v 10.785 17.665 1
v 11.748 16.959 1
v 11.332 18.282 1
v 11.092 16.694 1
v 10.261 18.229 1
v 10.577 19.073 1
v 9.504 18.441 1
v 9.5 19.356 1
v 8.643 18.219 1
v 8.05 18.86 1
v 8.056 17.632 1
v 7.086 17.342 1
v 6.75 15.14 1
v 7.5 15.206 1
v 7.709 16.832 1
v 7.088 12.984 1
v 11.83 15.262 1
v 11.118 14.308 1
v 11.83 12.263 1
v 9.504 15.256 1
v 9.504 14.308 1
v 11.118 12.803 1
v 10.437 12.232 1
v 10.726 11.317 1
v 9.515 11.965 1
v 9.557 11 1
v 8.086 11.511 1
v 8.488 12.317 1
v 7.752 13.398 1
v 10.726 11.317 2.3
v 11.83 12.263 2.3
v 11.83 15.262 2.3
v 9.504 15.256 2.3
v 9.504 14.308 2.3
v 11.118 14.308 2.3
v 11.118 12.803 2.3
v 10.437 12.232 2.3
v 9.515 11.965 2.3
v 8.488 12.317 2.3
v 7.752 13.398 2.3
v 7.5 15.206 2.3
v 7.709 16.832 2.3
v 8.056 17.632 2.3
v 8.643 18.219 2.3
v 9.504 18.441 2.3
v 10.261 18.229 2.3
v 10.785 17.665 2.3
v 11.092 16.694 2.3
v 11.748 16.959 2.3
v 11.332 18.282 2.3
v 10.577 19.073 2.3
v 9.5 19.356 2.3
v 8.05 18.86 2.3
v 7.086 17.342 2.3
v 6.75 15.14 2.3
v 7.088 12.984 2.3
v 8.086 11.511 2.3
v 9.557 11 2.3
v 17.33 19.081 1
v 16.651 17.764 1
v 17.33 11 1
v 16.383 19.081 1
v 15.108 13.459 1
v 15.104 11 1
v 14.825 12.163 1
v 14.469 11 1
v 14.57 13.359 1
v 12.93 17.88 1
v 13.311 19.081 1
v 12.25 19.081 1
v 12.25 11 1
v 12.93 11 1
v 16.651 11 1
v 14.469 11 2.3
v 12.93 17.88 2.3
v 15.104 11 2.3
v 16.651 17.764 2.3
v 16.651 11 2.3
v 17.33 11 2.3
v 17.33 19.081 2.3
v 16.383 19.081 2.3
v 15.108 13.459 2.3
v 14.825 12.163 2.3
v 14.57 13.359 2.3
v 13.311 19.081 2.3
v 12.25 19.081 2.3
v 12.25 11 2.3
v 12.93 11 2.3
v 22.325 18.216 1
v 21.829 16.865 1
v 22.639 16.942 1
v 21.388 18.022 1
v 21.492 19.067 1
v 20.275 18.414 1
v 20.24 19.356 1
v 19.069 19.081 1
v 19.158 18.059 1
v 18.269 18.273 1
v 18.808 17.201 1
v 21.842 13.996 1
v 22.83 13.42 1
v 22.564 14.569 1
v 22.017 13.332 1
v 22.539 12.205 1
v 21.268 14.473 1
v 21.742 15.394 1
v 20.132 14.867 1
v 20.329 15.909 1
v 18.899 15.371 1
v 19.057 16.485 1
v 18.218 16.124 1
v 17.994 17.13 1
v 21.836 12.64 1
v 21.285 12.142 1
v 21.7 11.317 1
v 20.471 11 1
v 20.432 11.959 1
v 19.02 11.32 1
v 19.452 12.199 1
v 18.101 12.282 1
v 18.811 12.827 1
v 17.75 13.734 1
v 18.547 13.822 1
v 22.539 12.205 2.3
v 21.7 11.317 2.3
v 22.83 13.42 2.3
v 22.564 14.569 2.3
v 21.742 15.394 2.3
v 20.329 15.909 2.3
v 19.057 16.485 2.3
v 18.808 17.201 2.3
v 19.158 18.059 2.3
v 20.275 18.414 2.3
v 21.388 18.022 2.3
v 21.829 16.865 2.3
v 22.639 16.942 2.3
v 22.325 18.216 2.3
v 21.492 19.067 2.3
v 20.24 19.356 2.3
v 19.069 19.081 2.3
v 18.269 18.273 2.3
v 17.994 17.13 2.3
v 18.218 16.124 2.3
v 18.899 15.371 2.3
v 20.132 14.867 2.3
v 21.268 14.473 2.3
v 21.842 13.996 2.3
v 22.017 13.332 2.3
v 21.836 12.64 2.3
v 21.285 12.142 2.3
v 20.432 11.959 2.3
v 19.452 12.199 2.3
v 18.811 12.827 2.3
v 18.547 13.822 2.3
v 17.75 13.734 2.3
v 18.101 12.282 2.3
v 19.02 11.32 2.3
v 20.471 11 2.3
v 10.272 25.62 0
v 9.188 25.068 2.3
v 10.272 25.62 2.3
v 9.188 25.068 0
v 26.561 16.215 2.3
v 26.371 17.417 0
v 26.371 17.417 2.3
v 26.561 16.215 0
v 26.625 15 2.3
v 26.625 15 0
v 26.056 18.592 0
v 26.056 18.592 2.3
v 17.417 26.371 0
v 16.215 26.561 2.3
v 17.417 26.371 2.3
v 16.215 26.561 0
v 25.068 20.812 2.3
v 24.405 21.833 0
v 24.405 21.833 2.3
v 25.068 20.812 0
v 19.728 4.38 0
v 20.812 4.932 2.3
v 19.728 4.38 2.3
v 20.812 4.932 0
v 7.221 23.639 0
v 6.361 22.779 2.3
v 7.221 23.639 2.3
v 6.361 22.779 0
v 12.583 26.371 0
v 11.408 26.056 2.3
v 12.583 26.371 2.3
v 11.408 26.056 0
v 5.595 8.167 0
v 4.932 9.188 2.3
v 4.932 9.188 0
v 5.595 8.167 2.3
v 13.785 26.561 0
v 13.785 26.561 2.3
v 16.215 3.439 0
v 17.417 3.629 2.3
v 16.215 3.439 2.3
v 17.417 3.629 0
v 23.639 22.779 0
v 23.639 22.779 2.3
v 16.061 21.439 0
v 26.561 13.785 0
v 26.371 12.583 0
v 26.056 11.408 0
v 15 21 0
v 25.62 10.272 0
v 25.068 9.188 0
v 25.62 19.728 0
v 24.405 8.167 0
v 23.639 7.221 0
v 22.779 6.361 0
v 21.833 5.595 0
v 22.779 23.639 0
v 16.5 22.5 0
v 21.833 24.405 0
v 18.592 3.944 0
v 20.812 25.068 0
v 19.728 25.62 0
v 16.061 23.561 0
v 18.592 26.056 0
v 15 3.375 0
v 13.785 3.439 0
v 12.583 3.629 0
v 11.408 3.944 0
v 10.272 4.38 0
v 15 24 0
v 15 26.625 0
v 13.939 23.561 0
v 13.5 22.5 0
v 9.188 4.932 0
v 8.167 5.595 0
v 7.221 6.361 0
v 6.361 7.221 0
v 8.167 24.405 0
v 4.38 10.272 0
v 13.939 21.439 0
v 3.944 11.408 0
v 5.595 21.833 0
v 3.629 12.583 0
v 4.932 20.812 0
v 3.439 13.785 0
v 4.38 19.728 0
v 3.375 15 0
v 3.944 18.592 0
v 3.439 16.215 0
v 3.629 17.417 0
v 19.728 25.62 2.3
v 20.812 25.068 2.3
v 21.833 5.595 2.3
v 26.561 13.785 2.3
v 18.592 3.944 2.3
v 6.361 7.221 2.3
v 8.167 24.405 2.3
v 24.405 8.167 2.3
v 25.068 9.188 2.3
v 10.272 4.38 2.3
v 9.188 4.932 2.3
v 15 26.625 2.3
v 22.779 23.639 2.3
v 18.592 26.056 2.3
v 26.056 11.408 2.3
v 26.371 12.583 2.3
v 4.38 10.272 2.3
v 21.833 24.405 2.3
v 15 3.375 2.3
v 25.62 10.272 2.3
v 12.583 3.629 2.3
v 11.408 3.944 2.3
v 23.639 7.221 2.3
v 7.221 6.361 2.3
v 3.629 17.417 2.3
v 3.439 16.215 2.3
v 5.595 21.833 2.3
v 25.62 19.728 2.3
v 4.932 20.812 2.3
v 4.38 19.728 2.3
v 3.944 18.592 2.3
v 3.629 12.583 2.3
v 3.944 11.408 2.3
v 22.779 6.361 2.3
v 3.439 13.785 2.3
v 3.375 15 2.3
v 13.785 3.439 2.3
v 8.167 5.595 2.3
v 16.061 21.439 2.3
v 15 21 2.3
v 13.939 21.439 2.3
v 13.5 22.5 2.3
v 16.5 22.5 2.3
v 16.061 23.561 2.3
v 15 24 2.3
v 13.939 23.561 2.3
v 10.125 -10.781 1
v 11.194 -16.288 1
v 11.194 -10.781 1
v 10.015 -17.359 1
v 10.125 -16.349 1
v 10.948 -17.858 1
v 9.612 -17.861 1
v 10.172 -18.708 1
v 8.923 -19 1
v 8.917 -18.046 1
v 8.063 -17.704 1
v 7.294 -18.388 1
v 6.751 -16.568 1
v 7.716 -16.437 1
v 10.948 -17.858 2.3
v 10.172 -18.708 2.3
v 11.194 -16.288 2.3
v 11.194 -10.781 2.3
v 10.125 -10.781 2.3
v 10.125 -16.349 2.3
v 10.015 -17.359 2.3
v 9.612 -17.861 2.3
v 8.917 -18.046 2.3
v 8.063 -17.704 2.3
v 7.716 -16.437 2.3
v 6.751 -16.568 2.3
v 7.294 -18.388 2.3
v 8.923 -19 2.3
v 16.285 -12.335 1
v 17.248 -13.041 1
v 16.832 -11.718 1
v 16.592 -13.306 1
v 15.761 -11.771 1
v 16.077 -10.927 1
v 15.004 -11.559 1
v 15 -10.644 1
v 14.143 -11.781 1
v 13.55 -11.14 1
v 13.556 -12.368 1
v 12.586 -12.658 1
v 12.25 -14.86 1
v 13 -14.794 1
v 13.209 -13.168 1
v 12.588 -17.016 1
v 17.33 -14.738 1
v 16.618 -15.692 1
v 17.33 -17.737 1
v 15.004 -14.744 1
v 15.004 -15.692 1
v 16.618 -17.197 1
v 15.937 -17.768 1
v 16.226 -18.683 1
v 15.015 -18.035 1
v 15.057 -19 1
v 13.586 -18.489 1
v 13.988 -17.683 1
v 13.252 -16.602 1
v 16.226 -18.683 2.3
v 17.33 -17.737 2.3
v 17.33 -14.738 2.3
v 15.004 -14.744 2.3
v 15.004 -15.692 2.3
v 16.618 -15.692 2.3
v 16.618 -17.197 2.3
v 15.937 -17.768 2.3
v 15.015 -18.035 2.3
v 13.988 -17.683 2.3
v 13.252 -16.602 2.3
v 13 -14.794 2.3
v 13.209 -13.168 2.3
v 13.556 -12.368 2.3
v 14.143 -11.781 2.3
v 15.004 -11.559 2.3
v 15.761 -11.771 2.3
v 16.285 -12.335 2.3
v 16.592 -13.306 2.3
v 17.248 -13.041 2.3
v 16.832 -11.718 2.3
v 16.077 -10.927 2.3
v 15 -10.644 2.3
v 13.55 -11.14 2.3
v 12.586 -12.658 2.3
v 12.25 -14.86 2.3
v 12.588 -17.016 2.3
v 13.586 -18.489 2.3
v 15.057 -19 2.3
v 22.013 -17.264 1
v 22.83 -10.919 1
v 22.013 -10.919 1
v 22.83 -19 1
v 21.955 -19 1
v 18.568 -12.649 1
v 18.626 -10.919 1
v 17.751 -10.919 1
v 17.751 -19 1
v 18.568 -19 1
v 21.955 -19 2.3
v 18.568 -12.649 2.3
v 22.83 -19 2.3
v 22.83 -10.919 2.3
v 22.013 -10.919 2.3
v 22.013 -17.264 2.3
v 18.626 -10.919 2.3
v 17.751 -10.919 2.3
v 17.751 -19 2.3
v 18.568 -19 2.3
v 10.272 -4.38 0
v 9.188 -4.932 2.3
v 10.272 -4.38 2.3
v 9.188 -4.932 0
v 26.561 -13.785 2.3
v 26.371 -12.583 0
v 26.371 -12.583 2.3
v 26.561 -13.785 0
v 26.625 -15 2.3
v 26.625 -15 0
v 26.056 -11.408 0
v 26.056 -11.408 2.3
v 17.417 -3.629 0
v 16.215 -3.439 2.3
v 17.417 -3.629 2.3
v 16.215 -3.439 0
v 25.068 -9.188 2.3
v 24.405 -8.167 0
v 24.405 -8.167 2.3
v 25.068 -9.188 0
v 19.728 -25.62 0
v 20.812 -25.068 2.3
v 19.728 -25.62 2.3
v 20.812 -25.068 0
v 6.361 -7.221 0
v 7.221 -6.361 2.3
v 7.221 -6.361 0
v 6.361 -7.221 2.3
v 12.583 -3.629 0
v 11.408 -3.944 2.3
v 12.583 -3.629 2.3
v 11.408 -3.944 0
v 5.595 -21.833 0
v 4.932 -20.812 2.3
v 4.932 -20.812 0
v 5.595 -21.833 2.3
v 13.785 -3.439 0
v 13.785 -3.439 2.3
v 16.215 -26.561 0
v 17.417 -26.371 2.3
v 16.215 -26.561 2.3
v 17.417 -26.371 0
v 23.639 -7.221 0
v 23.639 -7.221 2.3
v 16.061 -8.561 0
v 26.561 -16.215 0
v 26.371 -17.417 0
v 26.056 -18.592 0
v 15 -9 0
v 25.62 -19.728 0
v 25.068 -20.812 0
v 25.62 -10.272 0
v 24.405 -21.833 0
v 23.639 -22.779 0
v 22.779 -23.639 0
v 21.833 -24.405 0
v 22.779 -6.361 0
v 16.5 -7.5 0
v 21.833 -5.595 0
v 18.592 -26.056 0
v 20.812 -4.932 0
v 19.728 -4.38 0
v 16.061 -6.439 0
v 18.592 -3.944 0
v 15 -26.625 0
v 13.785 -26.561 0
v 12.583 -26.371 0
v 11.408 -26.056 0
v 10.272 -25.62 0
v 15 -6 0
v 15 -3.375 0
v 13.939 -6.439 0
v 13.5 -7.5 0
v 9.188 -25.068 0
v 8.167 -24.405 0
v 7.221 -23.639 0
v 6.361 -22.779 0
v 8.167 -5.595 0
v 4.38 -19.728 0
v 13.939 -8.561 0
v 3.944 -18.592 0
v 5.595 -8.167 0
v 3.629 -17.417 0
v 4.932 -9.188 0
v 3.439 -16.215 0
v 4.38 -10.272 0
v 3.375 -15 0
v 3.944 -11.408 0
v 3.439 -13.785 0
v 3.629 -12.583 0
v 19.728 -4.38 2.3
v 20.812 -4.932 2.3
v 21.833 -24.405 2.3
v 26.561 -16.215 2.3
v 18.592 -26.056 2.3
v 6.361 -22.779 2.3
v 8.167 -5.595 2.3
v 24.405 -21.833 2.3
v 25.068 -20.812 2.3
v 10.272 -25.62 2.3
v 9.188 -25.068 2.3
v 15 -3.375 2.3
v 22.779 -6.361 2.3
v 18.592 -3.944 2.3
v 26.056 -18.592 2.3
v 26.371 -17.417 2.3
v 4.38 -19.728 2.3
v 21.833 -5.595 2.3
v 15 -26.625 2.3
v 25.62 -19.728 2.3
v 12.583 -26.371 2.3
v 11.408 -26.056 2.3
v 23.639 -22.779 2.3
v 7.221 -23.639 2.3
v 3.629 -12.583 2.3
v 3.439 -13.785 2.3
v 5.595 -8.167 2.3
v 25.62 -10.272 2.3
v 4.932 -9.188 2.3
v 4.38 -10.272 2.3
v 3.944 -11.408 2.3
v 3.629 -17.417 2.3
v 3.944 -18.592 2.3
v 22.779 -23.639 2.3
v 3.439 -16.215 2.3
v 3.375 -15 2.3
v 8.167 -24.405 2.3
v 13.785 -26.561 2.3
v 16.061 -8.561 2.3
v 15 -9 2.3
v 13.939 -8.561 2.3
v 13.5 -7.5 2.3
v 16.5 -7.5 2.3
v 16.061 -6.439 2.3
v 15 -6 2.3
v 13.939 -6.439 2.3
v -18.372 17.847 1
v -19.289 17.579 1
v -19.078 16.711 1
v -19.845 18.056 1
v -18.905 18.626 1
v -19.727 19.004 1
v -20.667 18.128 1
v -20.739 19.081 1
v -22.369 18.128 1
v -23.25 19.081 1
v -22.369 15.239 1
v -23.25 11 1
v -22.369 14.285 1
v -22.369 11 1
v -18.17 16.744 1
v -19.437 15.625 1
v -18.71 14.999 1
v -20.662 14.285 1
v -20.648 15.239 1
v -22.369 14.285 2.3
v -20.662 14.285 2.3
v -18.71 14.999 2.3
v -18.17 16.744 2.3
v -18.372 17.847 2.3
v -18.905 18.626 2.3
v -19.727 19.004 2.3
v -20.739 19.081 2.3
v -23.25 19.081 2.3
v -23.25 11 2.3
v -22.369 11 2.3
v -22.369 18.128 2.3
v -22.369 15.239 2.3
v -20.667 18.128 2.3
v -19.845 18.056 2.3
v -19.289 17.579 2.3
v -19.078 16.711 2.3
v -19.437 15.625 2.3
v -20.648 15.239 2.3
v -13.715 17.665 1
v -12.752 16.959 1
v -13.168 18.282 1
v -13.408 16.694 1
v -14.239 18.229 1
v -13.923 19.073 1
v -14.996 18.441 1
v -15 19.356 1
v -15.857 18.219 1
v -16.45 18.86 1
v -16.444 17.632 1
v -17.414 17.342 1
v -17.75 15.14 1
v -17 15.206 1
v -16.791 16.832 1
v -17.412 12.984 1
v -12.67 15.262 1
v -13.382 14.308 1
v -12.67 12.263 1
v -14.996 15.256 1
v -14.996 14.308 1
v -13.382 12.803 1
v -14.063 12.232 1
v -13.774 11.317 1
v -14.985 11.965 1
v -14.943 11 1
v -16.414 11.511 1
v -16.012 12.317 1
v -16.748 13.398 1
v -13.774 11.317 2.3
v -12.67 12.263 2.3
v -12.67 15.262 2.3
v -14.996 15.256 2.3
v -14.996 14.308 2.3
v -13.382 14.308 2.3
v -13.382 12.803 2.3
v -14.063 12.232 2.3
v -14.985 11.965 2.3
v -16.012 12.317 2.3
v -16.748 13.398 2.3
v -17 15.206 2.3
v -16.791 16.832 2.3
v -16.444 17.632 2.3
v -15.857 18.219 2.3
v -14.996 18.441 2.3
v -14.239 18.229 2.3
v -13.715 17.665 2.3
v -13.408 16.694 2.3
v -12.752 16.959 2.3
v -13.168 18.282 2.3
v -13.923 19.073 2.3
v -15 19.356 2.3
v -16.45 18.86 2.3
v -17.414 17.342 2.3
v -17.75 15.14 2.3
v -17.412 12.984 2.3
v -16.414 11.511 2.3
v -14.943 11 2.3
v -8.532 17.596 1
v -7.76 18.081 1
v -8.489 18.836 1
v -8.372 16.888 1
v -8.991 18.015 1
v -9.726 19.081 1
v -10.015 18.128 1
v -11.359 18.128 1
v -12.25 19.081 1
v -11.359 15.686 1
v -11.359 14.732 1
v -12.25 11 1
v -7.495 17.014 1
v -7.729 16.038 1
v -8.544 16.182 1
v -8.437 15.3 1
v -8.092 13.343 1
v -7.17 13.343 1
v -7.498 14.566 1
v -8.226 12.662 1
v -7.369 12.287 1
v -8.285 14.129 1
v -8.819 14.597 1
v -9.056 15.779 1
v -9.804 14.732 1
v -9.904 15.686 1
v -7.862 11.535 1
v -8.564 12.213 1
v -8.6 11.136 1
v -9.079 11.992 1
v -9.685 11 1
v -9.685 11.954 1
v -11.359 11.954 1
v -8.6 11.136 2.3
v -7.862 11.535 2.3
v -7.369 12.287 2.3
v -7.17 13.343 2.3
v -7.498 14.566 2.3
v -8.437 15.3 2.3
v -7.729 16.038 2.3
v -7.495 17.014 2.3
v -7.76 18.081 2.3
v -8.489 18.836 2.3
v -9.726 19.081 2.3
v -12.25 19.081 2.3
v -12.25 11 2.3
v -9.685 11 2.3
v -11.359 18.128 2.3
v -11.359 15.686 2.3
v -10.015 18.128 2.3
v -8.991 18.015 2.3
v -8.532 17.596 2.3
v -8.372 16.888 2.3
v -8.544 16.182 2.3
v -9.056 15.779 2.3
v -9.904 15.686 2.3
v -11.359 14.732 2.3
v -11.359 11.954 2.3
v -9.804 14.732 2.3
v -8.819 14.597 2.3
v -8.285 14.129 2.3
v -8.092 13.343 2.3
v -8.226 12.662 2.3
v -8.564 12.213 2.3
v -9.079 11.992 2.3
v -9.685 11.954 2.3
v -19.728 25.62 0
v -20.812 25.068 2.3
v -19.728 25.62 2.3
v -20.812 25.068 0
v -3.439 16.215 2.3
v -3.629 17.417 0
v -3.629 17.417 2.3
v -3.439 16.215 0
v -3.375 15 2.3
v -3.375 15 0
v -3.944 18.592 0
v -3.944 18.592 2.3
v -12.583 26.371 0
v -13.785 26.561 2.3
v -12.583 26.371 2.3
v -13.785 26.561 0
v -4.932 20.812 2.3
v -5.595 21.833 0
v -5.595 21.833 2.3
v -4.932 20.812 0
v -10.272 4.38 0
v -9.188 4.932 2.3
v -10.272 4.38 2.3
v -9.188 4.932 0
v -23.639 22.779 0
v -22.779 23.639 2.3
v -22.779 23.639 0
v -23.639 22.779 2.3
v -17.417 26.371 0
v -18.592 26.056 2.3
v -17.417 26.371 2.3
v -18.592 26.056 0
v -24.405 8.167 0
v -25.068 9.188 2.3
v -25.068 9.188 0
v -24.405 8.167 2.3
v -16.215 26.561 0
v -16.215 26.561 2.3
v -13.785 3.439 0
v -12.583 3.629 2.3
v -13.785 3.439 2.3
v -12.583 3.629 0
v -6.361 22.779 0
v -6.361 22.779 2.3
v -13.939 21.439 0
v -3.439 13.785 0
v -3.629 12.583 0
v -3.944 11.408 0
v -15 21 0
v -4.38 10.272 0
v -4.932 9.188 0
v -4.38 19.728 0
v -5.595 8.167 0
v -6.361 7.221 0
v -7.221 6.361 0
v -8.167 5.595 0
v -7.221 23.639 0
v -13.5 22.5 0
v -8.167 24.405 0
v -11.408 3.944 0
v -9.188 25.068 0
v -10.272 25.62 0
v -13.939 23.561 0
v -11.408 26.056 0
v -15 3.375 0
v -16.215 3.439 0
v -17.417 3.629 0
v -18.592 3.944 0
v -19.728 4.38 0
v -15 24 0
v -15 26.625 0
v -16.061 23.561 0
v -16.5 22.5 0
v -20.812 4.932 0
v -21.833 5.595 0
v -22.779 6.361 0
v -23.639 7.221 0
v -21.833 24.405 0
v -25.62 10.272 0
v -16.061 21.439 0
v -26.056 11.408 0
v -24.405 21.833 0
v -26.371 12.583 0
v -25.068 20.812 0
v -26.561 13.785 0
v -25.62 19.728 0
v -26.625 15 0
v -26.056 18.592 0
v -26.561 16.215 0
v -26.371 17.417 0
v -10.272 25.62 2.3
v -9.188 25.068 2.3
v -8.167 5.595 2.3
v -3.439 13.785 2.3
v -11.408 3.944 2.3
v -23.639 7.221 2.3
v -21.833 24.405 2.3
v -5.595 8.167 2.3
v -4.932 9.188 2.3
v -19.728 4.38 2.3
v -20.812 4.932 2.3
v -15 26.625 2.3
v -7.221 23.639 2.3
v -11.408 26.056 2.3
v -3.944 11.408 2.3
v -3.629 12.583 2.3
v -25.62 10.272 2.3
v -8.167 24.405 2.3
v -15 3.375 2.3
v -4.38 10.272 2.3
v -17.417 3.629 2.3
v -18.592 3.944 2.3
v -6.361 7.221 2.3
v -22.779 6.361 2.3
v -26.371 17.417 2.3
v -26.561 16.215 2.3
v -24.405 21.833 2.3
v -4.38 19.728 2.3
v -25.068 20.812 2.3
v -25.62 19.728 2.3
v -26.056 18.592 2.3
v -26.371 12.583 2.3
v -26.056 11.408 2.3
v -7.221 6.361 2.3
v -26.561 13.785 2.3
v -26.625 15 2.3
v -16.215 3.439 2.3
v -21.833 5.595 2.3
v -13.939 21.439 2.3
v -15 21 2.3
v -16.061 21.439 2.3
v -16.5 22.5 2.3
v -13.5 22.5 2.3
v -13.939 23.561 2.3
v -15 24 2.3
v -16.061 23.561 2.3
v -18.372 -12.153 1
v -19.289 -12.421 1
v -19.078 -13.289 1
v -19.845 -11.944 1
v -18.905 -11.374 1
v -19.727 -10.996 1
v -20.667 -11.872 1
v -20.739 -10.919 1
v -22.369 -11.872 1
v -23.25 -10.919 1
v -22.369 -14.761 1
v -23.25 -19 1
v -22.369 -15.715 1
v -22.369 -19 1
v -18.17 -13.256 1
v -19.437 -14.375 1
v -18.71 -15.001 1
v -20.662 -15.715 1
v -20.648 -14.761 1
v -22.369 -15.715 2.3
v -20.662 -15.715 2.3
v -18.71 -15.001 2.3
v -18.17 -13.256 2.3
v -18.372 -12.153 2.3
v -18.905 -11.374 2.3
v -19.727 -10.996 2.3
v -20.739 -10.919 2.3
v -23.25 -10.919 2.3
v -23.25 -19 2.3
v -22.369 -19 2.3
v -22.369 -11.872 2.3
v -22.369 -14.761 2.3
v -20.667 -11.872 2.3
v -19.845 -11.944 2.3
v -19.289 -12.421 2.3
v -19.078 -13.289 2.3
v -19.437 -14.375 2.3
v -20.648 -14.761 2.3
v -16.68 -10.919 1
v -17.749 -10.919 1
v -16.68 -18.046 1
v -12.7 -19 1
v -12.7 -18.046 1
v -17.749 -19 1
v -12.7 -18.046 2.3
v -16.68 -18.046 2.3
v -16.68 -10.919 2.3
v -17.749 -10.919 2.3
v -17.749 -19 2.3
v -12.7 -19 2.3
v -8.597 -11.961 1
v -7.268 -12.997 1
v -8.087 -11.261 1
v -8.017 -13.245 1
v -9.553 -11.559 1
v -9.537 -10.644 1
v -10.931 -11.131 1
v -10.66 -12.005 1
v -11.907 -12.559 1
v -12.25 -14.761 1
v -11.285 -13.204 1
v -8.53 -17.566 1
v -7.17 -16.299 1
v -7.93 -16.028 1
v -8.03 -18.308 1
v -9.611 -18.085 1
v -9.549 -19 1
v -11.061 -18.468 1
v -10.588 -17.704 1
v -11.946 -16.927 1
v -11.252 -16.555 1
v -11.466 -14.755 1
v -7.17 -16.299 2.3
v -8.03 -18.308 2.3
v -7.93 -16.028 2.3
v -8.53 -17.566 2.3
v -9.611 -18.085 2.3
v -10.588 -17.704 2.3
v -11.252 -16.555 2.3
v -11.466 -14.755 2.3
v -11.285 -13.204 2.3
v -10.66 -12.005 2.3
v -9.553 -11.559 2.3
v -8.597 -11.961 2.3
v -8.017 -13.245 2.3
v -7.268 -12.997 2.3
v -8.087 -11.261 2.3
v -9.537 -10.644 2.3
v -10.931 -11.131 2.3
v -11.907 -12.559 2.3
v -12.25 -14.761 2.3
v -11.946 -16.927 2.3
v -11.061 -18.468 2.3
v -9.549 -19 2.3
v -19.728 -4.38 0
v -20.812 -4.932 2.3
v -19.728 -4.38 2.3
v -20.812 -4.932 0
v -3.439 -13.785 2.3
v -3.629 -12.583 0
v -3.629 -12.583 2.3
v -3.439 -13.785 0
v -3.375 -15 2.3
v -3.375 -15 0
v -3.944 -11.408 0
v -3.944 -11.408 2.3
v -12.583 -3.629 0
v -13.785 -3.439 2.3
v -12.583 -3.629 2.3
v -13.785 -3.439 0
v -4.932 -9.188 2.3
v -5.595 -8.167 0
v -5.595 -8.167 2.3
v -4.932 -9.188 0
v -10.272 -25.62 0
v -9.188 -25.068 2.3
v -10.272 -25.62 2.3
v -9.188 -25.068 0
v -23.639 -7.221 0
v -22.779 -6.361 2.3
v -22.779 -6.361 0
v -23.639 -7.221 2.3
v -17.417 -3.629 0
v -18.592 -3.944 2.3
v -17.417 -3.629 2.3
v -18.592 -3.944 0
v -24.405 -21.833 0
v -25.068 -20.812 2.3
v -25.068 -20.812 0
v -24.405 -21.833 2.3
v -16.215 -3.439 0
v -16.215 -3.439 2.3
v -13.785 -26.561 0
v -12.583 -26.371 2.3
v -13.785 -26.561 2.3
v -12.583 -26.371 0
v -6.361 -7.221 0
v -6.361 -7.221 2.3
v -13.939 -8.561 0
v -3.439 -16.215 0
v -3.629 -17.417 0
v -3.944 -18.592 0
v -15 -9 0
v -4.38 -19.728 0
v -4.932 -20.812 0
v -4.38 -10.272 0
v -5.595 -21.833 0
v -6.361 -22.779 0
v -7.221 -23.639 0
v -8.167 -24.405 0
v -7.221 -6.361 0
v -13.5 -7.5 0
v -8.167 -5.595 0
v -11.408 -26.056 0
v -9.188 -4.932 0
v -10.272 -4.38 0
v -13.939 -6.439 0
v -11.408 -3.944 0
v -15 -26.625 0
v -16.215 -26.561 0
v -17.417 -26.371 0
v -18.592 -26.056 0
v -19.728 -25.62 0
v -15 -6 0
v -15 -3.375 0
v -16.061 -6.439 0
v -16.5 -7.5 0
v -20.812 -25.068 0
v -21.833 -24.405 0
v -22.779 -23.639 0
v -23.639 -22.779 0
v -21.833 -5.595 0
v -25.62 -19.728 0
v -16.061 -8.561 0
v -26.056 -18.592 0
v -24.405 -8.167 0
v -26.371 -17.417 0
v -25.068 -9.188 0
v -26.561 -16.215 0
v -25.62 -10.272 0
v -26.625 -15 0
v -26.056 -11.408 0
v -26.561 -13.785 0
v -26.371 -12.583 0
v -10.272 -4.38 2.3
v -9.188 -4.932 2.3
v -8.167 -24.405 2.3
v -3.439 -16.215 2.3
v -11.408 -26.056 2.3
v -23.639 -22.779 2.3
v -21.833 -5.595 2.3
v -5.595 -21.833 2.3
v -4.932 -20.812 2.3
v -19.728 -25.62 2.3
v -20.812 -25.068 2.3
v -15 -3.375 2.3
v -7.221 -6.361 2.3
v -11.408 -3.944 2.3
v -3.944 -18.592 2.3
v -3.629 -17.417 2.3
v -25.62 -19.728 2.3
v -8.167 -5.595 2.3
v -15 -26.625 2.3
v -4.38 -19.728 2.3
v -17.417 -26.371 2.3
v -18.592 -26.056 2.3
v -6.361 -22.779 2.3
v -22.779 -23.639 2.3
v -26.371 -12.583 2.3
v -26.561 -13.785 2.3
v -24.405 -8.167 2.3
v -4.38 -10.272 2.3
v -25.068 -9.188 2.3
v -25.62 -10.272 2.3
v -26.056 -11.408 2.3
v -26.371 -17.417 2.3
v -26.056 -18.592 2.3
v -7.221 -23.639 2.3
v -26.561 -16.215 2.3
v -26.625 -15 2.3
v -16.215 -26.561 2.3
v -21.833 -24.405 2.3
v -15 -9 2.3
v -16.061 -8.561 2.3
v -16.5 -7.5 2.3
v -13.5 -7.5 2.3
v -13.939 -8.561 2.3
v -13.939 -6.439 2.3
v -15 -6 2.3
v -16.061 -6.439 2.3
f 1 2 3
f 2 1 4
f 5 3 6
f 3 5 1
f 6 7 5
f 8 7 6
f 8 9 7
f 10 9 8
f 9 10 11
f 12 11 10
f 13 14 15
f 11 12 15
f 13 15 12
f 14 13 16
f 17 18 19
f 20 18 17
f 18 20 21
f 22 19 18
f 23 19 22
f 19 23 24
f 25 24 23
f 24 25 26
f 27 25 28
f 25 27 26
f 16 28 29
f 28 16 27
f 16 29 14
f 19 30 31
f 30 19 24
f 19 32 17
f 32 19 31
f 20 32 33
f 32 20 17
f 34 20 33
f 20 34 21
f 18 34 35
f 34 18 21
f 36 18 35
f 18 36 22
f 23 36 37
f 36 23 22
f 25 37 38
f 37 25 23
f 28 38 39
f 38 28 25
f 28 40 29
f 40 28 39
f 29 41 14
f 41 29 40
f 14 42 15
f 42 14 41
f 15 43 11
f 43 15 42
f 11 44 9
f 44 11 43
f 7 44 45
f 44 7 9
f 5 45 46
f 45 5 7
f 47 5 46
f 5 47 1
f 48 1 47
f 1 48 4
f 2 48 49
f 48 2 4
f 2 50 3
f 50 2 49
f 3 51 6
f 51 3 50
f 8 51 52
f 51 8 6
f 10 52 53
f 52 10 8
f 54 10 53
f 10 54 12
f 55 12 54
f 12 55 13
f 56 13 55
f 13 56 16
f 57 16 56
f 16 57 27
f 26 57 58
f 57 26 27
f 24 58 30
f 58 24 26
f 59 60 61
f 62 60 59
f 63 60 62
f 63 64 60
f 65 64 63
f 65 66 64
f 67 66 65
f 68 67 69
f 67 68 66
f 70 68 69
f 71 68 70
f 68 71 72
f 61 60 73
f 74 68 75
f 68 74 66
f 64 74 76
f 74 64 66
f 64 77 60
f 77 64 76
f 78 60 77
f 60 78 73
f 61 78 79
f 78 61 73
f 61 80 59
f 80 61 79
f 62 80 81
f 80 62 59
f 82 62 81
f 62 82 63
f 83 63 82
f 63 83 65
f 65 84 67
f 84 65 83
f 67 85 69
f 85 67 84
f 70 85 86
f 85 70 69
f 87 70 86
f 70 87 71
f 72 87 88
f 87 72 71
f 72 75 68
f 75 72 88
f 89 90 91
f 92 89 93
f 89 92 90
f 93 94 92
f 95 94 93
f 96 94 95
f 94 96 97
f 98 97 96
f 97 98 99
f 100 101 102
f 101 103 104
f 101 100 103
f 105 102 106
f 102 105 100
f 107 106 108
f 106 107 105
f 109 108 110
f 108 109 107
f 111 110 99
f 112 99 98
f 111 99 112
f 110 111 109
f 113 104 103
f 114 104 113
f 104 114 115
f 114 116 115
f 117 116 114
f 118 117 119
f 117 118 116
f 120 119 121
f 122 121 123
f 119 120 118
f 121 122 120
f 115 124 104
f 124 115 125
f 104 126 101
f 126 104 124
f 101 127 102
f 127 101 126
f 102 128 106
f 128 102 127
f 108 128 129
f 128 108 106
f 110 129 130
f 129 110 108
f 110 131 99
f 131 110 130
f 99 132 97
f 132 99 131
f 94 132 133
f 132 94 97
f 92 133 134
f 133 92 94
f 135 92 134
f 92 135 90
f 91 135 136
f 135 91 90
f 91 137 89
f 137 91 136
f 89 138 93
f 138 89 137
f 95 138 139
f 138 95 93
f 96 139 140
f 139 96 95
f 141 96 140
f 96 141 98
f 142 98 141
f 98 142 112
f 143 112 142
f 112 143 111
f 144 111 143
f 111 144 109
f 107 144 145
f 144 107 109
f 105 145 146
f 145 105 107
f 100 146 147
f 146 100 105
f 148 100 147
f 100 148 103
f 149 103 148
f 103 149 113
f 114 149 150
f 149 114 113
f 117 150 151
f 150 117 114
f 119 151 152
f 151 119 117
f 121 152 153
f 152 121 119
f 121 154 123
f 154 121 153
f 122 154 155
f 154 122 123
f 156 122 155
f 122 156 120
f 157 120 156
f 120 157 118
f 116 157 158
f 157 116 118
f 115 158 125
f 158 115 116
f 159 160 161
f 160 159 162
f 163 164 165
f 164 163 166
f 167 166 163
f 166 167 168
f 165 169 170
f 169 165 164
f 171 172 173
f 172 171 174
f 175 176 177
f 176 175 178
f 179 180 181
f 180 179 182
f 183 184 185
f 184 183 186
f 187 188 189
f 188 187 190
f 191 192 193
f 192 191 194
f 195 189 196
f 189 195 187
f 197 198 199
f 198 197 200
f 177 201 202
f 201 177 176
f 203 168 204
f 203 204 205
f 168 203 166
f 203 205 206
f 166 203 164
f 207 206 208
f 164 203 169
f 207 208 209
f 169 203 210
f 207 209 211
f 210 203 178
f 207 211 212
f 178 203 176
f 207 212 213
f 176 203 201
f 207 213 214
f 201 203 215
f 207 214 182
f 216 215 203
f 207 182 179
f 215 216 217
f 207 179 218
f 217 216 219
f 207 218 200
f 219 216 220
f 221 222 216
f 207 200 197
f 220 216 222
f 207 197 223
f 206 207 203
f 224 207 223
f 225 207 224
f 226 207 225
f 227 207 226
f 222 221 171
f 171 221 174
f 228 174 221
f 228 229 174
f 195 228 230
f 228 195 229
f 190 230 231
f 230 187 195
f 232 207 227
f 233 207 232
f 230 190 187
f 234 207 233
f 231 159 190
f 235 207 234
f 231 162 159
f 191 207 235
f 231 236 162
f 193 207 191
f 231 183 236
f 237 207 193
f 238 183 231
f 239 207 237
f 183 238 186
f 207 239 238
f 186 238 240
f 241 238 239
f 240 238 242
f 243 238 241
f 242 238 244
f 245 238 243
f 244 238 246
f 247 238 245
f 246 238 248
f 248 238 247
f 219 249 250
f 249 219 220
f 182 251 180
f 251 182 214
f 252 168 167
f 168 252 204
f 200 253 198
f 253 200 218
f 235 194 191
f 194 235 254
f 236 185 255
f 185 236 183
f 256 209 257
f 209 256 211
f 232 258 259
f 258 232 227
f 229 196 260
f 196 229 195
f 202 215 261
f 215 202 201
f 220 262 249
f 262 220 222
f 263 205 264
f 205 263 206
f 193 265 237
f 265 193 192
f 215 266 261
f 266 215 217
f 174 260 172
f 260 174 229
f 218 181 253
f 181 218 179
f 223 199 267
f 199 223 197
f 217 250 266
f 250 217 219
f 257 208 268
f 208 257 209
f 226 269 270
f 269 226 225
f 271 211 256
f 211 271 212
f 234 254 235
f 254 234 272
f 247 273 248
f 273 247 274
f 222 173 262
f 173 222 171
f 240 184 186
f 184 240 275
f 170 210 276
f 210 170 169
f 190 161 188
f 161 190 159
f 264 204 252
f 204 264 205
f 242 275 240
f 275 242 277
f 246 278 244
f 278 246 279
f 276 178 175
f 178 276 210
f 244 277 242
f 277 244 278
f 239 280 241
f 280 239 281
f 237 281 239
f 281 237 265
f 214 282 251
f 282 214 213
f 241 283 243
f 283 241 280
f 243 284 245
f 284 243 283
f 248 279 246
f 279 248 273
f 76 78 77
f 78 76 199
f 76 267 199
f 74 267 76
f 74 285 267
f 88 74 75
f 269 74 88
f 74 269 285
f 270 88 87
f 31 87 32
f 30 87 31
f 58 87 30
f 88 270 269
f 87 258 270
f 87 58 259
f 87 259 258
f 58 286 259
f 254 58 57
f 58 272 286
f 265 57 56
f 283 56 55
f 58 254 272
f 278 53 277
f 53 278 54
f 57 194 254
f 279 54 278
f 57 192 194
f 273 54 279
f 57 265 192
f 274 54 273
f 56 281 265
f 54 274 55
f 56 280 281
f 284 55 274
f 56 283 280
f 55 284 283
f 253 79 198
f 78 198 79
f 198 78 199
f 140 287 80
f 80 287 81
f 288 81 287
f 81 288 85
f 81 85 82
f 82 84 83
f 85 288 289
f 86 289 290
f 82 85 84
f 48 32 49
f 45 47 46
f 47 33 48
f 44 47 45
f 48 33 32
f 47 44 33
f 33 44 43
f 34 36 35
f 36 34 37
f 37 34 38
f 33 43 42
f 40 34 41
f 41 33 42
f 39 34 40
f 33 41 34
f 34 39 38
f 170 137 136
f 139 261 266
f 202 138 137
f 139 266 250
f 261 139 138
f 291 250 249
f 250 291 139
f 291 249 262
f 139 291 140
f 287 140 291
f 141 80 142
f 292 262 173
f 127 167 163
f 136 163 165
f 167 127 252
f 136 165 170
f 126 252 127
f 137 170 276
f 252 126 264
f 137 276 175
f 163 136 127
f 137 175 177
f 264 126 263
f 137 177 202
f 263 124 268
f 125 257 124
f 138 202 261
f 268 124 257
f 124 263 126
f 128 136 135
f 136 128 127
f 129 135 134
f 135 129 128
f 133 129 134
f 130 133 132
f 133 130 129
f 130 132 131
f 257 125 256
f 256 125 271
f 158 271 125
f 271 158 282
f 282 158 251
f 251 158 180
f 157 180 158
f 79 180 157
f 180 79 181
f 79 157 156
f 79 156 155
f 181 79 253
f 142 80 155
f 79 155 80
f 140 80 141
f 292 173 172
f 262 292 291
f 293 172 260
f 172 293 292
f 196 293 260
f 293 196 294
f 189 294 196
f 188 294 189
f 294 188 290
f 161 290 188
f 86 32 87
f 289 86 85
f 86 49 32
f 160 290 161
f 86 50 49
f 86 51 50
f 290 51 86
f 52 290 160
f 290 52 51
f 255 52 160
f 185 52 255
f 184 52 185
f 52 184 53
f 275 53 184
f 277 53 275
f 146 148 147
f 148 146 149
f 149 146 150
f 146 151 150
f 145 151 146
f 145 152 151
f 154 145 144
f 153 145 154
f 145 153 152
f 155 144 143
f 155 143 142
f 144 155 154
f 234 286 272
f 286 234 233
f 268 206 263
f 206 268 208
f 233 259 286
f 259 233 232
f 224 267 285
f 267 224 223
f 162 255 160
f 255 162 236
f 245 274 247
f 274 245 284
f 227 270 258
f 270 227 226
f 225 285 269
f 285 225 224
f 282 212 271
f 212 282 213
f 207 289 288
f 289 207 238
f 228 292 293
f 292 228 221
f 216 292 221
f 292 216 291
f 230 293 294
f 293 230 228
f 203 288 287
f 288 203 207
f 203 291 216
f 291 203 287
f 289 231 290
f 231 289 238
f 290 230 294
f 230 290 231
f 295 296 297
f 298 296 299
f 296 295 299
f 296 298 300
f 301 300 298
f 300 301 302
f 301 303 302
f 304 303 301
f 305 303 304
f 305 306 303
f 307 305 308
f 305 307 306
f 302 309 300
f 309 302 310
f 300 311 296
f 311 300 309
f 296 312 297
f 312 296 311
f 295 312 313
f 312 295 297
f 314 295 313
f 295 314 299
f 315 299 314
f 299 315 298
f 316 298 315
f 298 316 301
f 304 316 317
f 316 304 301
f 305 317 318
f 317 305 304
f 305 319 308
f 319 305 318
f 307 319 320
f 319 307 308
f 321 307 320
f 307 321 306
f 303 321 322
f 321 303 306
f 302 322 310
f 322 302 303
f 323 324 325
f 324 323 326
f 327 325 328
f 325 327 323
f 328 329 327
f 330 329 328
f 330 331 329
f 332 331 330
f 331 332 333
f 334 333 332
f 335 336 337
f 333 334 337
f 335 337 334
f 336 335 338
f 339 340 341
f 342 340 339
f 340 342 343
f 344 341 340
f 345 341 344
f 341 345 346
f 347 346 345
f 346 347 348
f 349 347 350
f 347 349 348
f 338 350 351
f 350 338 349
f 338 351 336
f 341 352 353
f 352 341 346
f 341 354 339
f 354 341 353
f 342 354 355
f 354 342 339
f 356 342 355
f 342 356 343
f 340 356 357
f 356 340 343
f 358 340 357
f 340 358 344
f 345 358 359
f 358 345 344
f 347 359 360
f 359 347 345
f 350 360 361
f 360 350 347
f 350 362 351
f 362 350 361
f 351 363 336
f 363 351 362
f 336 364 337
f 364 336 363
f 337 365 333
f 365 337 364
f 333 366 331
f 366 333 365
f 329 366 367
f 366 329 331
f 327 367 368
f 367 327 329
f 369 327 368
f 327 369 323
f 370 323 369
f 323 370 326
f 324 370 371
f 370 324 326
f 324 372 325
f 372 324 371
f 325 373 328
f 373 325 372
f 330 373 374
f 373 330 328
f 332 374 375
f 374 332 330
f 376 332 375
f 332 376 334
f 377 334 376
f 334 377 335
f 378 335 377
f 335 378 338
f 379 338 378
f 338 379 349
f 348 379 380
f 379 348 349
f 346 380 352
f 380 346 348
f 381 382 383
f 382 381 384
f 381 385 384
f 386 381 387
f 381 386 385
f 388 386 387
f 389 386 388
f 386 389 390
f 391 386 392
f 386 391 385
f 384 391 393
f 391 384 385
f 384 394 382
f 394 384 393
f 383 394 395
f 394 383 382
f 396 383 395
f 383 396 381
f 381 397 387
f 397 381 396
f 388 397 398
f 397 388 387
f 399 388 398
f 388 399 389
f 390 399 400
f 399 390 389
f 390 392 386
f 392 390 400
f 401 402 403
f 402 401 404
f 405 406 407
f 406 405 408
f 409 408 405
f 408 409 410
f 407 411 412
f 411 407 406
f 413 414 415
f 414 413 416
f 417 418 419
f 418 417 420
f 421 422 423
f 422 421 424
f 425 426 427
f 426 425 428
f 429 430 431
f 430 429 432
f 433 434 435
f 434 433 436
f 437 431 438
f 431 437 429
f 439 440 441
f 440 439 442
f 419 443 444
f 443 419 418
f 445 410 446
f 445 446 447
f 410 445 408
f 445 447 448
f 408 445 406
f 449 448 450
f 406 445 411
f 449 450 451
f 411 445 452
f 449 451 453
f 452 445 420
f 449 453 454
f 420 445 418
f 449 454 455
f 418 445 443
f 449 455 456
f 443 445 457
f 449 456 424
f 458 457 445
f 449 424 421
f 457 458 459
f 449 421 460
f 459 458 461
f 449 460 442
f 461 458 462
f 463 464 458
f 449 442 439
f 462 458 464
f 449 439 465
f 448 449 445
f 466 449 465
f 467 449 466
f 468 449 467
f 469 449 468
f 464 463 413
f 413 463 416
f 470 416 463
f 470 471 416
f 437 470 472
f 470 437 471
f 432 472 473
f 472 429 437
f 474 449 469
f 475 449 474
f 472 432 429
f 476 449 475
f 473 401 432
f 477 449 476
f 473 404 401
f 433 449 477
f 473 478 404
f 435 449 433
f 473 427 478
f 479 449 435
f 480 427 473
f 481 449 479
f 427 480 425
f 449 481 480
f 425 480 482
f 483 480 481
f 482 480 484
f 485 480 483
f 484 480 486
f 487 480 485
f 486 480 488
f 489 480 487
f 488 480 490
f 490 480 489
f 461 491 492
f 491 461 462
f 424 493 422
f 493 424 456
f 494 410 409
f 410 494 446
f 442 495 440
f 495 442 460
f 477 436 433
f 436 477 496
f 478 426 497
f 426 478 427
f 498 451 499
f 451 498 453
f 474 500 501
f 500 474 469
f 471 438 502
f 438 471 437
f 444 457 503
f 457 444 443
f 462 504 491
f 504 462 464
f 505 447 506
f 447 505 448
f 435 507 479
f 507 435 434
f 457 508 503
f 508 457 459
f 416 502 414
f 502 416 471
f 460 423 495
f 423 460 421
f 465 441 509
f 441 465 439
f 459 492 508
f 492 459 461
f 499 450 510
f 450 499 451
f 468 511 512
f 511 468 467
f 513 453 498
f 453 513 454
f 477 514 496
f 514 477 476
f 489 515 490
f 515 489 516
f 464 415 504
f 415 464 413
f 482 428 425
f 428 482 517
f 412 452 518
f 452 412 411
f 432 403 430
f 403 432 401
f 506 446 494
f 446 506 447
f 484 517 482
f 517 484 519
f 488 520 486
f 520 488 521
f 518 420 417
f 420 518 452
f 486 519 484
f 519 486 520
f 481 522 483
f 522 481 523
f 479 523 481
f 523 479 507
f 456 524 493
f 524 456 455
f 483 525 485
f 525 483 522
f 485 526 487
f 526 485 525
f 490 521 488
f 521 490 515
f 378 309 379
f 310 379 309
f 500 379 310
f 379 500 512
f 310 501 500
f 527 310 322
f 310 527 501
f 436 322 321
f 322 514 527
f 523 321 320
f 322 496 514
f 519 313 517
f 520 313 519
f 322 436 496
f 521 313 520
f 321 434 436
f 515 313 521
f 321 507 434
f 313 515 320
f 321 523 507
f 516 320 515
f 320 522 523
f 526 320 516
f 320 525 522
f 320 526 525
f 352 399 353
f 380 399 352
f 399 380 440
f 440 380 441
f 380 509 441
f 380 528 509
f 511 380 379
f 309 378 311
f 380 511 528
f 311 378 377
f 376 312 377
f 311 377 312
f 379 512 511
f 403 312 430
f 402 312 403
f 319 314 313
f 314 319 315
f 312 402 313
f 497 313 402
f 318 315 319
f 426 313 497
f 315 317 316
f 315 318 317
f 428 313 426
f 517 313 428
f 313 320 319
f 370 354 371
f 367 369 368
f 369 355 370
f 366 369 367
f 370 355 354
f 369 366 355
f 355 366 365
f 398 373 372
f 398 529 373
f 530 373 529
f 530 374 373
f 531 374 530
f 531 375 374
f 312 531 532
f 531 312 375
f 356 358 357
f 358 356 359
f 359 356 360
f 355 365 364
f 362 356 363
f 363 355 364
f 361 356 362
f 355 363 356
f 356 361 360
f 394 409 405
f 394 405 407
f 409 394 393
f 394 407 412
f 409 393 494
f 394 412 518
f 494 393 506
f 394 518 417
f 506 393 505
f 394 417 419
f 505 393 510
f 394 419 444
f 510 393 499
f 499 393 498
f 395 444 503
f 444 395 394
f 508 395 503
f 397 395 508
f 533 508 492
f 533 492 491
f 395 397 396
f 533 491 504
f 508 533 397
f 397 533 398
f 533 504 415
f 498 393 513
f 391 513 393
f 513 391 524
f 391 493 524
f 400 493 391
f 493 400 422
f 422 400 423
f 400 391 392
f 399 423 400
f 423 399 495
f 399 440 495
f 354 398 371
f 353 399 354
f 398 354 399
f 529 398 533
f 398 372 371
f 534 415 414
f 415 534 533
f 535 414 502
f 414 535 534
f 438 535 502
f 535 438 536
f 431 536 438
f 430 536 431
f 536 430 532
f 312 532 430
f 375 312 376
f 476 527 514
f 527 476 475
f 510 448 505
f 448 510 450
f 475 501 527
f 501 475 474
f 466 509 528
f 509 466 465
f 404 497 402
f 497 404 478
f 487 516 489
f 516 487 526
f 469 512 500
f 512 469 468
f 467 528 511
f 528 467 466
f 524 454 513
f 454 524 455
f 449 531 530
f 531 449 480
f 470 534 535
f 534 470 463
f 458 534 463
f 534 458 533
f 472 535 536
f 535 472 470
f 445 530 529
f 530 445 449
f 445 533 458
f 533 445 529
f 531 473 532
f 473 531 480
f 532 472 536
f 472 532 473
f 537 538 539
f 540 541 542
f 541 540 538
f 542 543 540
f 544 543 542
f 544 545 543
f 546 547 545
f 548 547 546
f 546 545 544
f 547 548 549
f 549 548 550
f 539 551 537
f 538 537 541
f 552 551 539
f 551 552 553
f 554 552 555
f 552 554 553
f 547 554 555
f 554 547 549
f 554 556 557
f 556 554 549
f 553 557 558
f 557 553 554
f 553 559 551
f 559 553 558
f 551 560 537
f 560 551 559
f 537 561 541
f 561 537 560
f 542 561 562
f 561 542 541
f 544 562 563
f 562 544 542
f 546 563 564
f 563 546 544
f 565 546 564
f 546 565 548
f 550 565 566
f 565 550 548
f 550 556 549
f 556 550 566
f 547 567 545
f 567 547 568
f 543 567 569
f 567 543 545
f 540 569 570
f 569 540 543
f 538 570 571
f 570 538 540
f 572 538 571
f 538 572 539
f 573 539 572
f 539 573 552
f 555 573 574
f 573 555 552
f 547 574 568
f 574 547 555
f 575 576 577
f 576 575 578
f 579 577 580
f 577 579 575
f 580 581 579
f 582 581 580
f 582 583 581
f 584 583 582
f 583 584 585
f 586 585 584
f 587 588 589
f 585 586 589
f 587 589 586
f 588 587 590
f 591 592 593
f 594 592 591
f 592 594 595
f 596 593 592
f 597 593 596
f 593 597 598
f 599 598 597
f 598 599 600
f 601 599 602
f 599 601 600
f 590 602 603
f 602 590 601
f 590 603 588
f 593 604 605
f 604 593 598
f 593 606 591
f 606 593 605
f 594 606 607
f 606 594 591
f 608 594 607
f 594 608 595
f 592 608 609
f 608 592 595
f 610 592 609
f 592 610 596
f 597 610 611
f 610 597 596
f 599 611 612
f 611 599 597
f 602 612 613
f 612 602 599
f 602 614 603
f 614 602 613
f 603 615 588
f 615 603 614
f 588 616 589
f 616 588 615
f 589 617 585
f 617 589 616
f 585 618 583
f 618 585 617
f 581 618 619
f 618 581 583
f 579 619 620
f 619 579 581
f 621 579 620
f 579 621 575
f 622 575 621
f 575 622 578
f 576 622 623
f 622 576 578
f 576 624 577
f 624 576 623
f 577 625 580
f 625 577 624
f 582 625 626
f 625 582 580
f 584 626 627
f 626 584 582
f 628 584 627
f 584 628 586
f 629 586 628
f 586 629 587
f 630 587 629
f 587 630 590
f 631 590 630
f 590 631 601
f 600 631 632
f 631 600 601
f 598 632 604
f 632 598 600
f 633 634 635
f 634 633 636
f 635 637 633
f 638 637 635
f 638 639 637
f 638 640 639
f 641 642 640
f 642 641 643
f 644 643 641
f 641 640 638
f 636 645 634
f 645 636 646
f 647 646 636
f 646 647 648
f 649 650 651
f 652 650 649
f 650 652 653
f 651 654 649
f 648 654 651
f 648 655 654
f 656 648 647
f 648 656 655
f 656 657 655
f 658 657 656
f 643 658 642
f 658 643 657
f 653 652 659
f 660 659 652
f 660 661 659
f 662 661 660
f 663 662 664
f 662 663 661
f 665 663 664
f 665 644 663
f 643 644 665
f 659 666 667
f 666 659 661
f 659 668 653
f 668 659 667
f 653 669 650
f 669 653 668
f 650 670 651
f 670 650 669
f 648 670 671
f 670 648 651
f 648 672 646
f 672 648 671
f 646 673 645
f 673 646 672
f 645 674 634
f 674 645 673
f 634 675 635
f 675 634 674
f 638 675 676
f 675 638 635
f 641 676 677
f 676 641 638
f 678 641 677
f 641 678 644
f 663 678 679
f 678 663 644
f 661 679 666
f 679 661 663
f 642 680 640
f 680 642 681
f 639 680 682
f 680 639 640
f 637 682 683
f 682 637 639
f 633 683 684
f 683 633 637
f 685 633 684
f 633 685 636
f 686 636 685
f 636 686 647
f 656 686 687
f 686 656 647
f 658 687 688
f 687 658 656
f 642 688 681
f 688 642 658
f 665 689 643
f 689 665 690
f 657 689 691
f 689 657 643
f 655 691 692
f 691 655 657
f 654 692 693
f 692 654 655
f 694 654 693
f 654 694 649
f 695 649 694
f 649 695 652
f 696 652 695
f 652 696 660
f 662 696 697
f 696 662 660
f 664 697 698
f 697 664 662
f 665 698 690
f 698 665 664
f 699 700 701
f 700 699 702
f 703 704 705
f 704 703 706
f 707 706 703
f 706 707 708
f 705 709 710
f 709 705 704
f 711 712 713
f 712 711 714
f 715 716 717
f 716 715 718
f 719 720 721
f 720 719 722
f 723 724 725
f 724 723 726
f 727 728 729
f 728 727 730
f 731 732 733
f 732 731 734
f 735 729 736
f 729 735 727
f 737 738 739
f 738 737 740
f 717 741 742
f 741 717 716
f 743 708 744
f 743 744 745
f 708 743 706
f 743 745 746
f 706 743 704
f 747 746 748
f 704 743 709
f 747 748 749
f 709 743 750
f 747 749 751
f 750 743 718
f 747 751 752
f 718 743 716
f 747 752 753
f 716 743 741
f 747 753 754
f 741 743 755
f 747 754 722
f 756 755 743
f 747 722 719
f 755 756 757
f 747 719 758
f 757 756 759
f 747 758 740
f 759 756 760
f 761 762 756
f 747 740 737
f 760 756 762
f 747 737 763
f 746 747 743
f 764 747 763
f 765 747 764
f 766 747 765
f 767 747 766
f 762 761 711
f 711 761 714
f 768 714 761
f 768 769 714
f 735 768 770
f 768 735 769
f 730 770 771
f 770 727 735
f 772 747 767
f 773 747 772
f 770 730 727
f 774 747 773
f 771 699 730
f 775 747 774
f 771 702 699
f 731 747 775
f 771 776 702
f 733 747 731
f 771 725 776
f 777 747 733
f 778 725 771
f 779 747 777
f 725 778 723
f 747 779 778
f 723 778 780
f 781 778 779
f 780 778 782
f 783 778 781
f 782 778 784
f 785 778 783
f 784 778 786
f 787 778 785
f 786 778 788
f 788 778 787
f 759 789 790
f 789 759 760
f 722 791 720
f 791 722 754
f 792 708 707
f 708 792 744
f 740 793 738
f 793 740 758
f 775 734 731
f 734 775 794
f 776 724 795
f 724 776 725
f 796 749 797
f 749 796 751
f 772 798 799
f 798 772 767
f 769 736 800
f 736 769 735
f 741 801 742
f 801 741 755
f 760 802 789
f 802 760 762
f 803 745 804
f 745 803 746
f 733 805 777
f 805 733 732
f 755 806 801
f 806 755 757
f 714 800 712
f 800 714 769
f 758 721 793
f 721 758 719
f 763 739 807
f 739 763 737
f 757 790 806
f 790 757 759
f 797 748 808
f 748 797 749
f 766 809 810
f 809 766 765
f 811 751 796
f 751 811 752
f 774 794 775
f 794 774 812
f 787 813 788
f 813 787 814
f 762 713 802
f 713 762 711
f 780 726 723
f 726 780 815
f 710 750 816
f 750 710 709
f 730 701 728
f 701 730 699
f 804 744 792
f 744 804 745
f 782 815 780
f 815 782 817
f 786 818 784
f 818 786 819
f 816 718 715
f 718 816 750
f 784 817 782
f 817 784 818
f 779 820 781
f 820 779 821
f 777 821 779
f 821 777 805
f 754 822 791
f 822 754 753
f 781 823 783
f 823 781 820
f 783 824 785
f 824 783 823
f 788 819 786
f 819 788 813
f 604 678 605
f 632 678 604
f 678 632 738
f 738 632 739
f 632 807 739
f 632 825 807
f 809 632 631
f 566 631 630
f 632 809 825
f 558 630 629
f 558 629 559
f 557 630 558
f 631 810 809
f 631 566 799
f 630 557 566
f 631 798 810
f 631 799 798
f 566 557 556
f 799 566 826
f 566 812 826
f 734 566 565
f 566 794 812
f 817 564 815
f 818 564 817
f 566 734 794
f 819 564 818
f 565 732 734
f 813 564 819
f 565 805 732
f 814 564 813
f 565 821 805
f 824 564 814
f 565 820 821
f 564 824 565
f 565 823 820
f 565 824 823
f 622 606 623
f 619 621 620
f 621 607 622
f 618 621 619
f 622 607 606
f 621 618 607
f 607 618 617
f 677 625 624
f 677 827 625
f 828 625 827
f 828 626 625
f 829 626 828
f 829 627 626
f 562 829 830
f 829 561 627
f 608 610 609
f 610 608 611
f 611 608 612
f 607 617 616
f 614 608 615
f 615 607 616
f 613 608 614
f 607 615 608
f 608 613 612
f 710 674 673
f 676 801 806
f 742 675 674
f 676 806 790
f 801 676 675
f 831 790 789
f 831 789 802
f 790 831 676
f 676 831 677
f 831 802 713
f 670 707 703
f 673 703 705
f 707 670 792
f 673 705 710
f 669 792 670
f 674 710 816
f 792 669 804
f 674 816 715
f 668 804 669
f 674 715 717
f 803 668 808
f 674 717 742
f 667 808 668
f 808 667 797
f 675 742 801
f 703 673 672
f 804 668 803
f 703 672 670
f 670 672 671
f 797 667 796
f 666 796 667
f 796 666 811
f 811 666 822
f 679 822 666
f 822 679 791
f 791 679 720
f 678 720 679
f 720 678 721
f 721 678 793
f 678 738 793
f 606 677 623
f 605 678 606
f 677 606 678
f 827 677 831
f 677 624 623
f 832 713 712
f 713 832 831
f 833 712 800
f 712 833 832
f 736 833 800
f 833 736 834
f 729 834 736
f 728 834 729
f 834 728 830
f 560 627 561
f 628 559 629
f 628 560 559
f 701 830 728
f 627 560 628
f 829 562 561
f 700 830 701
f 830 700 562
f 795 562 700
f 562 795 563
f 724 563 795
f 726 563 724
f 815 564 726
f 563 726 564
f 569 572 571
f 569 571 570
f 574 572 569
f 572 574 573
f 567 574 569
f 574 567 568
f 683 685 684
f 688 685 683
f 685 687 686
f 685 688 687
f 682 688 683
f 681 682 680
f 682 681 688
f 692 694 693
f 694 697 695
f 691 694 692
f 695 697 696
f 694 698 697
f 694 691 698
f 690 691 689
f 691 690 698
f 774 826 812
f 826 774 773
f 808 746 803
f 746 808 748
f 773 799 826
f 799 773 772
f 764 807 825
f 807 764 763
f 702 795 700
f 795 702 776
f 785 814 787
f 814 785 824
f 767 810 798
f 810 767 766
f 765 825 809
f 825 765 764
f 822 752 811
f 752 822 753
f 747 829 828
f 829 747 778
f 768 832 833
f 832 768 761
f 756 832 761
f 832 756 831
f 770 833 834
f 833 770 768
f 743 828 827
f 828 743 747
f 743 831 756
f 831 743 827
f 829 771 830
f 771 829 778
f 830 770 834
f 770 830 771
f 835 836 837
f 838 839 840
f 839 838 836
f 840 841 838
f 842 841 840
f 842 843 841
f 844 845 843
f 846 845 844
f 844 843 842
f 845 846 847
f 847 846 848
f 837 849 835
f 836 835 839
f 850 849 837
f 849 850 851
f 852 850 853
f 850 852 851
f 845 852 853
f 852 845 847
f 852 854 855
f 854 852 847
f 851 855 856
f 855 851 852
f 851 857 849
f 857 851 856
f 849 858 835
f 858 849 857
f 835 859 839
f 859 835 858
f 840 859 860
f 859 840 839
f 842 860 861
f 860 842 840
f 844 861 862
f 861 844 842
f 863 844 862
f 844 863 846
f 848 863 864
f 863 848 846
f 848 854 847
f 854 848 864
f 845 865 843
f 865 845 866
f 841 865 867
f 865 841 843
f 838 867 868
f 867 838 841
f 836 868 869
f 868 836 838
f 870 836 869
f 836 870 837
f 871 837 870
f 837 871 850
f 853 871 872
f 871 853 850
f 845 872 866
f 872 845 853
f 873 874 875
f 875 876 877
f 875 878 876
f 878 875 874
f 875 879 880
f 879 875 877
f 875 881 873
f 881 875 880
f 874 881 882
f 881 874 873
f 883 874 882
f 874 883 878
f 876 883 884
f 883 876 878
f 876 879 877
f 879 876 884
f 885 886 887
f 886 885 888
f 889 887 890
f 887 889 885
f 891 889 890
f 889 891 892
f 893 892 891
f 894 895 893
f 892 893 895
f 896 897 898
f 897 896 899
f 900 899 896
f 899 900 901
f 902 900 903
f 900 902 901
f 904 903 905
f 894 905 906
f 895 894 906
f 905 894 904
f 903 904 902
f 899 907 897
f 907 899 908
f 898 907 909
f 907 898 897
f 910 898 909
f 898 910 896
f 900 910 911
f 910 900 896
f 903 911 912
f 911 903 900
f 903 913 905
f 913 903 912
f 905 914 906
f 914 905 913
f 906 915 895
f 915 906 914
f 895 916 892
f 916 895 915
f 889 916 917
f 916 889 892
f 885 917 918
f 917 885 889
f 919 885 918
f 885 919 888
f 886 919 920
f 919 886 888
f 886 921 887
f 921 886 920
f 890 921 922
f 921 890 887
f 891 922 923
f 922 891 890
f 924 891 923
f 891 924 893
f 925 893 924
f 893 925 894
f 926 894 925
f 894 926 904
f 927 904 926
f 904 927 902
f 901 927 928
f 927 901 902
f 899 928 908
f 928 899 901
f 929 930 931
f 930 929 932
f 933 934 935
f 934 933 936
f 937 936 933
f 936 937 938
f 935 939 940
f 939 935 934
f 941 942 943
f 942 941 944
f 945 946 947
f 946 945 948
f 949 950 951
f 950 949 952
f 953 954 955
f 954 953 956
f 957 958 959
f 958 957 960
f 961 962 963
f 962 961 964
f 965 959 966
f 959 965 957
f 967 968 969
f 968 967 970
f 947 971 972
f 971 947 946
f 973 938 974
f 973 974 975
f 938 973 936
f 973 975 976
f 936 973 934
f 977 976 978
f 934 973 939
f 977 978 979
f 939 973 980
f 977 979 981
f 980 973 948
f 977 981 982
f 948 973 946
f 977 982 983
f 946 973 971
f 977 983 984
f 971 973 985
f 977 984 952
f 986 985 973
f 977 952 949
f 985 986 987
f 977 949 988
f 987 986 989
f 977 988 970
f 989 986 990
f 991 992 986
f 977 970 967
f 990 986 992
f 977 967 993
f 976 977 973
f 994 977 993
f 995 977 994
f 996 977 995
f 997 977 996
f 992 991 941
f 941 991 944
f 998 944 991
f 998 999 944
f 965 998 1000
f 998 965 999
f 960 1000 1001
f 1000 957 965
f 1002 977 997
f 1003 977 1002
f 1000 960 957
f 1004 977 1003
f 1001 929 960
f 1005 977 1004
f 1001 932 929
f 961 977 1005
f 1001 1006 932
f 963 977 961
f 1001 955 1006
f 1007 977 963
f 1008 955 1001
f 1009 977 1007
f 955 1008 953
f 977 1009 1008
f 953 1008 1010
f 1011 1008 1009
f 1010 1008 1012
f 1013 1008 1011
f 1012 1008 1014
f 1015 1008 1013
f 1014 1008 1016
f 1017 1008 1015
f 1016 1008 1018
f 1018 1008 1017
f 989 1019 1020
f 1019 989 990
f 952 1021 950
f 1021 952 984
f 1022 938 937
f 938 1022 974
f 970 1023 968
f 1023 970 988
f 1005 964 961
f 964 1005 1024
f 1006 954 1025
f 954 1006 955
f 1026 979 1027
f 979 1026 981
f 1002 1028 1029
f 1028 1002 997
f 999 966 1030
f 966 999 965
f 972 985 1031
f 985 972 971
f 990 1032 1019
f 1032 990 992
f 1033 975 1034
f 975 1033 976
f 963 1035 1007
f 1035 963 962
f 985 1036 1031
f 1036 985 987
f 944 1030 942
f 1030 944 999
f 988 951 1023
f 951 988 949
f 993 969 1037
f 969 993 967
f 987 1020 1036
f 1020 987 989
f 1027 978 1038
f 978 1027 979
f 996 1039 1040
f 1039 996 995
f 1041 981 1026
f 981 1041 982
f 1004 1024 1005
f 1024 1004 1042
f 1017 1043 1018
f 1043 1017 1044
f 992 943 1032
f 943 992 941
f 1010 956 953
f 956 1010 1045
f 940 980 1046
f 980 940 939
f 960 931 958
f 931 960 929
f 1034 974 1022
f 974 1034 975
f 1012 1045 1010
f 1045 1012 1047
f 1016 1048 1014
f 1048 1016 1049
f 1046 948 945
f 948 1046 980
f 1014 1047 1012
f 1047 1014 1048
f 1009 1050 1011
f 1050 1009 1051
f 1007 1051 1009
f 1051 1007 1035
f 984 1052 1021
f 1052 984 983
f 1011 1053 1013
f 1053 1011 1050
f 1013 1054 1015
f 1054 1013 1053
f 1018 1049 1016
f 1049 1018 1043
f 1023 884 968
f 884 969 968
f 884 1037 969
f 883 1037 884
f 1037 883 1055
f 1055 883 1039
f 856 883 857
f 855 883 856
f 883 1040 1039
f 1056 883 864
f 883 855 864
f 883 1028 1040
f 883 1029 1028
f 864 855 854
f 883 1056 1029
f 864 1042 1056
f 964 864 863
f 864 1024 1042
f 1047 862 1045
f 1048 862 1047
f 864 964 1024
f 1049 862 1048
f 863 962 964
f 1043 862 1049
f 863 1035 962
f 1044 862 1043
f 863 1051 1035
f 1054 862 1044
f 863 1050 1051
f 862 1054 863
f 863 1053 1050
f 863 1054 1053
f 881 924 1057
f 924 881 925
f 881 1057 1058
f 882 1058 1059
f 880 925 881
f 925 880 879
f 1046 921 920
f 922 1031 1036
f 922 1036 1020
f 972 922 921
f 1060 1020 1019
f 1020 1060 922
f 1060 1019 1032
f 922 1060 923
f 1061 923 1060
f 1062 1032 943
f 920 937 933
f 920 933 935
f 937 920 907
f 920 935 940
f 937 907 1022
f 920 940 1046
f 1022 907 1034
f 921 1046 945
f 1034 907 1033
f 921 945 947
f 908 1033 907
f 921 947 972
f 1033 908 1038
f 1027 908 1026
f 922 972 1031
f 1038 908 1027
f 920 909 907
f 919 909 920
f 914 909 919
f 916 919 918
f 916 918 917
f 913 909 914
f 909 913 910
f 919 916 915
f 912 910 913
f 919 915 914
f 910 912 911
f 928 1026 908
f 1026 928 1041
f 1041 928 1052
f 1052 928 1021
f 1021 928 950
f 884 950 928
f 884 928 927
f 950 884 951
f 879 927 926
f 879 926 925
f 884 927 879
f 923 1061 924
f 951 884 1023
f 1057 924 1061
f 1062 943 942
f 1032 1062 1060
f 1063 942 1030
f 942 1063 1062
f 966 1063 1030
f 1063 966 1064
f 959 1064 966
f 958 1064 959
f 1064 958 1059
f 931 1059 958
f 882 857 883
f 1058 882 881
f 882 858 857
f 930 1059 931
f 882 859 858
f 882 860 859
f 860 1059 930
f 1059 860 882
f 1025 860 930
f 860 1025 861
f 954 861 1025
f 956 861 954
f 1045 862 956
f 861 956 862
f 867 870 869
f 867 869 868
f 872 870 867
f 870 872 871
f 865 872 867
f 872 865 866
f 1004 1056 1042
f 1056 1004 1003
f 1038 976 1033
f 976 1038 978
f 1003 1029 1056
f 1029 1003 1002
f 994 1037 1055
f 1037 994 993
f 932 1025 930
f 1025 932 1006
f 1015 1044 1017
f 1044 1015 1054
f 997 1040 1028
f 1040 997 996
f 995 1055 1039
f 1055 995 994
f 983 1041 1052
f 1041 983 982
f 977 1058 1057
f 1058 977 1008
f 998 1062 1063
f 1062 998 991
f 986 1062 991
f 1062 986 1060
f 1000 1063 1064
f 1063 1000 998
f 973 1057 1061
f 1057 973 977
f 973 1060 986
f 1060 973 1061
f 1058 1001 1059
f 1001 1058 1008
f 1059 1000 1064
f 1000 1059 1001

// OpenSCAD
// Fusito v2.0
// http://clonewars.es
//
// based on William Adams' excellent ball-and-socket code
use <WriteSVG.scad>

iniciales = "GMS";

module moneda(texto = iniciales)
{
	altura = 3;
	difference(){
		cylinder(r=23.25/2, h=2.3, $fn=60);

		translate([0,0,altura/2+1])write(texto,t=altura,h=8, center=true);
		translate([0,7.5,0])cylinder(r=3/2, h=6, $fn=8,center=true);
	}

}

translate([15,15,0])moneda("GMS");
translate([15,-15,0])moneda("JGN");
translate([-15,15,0])moneda("PGB");
translate([-15,-15,0])moneda("PLC");
